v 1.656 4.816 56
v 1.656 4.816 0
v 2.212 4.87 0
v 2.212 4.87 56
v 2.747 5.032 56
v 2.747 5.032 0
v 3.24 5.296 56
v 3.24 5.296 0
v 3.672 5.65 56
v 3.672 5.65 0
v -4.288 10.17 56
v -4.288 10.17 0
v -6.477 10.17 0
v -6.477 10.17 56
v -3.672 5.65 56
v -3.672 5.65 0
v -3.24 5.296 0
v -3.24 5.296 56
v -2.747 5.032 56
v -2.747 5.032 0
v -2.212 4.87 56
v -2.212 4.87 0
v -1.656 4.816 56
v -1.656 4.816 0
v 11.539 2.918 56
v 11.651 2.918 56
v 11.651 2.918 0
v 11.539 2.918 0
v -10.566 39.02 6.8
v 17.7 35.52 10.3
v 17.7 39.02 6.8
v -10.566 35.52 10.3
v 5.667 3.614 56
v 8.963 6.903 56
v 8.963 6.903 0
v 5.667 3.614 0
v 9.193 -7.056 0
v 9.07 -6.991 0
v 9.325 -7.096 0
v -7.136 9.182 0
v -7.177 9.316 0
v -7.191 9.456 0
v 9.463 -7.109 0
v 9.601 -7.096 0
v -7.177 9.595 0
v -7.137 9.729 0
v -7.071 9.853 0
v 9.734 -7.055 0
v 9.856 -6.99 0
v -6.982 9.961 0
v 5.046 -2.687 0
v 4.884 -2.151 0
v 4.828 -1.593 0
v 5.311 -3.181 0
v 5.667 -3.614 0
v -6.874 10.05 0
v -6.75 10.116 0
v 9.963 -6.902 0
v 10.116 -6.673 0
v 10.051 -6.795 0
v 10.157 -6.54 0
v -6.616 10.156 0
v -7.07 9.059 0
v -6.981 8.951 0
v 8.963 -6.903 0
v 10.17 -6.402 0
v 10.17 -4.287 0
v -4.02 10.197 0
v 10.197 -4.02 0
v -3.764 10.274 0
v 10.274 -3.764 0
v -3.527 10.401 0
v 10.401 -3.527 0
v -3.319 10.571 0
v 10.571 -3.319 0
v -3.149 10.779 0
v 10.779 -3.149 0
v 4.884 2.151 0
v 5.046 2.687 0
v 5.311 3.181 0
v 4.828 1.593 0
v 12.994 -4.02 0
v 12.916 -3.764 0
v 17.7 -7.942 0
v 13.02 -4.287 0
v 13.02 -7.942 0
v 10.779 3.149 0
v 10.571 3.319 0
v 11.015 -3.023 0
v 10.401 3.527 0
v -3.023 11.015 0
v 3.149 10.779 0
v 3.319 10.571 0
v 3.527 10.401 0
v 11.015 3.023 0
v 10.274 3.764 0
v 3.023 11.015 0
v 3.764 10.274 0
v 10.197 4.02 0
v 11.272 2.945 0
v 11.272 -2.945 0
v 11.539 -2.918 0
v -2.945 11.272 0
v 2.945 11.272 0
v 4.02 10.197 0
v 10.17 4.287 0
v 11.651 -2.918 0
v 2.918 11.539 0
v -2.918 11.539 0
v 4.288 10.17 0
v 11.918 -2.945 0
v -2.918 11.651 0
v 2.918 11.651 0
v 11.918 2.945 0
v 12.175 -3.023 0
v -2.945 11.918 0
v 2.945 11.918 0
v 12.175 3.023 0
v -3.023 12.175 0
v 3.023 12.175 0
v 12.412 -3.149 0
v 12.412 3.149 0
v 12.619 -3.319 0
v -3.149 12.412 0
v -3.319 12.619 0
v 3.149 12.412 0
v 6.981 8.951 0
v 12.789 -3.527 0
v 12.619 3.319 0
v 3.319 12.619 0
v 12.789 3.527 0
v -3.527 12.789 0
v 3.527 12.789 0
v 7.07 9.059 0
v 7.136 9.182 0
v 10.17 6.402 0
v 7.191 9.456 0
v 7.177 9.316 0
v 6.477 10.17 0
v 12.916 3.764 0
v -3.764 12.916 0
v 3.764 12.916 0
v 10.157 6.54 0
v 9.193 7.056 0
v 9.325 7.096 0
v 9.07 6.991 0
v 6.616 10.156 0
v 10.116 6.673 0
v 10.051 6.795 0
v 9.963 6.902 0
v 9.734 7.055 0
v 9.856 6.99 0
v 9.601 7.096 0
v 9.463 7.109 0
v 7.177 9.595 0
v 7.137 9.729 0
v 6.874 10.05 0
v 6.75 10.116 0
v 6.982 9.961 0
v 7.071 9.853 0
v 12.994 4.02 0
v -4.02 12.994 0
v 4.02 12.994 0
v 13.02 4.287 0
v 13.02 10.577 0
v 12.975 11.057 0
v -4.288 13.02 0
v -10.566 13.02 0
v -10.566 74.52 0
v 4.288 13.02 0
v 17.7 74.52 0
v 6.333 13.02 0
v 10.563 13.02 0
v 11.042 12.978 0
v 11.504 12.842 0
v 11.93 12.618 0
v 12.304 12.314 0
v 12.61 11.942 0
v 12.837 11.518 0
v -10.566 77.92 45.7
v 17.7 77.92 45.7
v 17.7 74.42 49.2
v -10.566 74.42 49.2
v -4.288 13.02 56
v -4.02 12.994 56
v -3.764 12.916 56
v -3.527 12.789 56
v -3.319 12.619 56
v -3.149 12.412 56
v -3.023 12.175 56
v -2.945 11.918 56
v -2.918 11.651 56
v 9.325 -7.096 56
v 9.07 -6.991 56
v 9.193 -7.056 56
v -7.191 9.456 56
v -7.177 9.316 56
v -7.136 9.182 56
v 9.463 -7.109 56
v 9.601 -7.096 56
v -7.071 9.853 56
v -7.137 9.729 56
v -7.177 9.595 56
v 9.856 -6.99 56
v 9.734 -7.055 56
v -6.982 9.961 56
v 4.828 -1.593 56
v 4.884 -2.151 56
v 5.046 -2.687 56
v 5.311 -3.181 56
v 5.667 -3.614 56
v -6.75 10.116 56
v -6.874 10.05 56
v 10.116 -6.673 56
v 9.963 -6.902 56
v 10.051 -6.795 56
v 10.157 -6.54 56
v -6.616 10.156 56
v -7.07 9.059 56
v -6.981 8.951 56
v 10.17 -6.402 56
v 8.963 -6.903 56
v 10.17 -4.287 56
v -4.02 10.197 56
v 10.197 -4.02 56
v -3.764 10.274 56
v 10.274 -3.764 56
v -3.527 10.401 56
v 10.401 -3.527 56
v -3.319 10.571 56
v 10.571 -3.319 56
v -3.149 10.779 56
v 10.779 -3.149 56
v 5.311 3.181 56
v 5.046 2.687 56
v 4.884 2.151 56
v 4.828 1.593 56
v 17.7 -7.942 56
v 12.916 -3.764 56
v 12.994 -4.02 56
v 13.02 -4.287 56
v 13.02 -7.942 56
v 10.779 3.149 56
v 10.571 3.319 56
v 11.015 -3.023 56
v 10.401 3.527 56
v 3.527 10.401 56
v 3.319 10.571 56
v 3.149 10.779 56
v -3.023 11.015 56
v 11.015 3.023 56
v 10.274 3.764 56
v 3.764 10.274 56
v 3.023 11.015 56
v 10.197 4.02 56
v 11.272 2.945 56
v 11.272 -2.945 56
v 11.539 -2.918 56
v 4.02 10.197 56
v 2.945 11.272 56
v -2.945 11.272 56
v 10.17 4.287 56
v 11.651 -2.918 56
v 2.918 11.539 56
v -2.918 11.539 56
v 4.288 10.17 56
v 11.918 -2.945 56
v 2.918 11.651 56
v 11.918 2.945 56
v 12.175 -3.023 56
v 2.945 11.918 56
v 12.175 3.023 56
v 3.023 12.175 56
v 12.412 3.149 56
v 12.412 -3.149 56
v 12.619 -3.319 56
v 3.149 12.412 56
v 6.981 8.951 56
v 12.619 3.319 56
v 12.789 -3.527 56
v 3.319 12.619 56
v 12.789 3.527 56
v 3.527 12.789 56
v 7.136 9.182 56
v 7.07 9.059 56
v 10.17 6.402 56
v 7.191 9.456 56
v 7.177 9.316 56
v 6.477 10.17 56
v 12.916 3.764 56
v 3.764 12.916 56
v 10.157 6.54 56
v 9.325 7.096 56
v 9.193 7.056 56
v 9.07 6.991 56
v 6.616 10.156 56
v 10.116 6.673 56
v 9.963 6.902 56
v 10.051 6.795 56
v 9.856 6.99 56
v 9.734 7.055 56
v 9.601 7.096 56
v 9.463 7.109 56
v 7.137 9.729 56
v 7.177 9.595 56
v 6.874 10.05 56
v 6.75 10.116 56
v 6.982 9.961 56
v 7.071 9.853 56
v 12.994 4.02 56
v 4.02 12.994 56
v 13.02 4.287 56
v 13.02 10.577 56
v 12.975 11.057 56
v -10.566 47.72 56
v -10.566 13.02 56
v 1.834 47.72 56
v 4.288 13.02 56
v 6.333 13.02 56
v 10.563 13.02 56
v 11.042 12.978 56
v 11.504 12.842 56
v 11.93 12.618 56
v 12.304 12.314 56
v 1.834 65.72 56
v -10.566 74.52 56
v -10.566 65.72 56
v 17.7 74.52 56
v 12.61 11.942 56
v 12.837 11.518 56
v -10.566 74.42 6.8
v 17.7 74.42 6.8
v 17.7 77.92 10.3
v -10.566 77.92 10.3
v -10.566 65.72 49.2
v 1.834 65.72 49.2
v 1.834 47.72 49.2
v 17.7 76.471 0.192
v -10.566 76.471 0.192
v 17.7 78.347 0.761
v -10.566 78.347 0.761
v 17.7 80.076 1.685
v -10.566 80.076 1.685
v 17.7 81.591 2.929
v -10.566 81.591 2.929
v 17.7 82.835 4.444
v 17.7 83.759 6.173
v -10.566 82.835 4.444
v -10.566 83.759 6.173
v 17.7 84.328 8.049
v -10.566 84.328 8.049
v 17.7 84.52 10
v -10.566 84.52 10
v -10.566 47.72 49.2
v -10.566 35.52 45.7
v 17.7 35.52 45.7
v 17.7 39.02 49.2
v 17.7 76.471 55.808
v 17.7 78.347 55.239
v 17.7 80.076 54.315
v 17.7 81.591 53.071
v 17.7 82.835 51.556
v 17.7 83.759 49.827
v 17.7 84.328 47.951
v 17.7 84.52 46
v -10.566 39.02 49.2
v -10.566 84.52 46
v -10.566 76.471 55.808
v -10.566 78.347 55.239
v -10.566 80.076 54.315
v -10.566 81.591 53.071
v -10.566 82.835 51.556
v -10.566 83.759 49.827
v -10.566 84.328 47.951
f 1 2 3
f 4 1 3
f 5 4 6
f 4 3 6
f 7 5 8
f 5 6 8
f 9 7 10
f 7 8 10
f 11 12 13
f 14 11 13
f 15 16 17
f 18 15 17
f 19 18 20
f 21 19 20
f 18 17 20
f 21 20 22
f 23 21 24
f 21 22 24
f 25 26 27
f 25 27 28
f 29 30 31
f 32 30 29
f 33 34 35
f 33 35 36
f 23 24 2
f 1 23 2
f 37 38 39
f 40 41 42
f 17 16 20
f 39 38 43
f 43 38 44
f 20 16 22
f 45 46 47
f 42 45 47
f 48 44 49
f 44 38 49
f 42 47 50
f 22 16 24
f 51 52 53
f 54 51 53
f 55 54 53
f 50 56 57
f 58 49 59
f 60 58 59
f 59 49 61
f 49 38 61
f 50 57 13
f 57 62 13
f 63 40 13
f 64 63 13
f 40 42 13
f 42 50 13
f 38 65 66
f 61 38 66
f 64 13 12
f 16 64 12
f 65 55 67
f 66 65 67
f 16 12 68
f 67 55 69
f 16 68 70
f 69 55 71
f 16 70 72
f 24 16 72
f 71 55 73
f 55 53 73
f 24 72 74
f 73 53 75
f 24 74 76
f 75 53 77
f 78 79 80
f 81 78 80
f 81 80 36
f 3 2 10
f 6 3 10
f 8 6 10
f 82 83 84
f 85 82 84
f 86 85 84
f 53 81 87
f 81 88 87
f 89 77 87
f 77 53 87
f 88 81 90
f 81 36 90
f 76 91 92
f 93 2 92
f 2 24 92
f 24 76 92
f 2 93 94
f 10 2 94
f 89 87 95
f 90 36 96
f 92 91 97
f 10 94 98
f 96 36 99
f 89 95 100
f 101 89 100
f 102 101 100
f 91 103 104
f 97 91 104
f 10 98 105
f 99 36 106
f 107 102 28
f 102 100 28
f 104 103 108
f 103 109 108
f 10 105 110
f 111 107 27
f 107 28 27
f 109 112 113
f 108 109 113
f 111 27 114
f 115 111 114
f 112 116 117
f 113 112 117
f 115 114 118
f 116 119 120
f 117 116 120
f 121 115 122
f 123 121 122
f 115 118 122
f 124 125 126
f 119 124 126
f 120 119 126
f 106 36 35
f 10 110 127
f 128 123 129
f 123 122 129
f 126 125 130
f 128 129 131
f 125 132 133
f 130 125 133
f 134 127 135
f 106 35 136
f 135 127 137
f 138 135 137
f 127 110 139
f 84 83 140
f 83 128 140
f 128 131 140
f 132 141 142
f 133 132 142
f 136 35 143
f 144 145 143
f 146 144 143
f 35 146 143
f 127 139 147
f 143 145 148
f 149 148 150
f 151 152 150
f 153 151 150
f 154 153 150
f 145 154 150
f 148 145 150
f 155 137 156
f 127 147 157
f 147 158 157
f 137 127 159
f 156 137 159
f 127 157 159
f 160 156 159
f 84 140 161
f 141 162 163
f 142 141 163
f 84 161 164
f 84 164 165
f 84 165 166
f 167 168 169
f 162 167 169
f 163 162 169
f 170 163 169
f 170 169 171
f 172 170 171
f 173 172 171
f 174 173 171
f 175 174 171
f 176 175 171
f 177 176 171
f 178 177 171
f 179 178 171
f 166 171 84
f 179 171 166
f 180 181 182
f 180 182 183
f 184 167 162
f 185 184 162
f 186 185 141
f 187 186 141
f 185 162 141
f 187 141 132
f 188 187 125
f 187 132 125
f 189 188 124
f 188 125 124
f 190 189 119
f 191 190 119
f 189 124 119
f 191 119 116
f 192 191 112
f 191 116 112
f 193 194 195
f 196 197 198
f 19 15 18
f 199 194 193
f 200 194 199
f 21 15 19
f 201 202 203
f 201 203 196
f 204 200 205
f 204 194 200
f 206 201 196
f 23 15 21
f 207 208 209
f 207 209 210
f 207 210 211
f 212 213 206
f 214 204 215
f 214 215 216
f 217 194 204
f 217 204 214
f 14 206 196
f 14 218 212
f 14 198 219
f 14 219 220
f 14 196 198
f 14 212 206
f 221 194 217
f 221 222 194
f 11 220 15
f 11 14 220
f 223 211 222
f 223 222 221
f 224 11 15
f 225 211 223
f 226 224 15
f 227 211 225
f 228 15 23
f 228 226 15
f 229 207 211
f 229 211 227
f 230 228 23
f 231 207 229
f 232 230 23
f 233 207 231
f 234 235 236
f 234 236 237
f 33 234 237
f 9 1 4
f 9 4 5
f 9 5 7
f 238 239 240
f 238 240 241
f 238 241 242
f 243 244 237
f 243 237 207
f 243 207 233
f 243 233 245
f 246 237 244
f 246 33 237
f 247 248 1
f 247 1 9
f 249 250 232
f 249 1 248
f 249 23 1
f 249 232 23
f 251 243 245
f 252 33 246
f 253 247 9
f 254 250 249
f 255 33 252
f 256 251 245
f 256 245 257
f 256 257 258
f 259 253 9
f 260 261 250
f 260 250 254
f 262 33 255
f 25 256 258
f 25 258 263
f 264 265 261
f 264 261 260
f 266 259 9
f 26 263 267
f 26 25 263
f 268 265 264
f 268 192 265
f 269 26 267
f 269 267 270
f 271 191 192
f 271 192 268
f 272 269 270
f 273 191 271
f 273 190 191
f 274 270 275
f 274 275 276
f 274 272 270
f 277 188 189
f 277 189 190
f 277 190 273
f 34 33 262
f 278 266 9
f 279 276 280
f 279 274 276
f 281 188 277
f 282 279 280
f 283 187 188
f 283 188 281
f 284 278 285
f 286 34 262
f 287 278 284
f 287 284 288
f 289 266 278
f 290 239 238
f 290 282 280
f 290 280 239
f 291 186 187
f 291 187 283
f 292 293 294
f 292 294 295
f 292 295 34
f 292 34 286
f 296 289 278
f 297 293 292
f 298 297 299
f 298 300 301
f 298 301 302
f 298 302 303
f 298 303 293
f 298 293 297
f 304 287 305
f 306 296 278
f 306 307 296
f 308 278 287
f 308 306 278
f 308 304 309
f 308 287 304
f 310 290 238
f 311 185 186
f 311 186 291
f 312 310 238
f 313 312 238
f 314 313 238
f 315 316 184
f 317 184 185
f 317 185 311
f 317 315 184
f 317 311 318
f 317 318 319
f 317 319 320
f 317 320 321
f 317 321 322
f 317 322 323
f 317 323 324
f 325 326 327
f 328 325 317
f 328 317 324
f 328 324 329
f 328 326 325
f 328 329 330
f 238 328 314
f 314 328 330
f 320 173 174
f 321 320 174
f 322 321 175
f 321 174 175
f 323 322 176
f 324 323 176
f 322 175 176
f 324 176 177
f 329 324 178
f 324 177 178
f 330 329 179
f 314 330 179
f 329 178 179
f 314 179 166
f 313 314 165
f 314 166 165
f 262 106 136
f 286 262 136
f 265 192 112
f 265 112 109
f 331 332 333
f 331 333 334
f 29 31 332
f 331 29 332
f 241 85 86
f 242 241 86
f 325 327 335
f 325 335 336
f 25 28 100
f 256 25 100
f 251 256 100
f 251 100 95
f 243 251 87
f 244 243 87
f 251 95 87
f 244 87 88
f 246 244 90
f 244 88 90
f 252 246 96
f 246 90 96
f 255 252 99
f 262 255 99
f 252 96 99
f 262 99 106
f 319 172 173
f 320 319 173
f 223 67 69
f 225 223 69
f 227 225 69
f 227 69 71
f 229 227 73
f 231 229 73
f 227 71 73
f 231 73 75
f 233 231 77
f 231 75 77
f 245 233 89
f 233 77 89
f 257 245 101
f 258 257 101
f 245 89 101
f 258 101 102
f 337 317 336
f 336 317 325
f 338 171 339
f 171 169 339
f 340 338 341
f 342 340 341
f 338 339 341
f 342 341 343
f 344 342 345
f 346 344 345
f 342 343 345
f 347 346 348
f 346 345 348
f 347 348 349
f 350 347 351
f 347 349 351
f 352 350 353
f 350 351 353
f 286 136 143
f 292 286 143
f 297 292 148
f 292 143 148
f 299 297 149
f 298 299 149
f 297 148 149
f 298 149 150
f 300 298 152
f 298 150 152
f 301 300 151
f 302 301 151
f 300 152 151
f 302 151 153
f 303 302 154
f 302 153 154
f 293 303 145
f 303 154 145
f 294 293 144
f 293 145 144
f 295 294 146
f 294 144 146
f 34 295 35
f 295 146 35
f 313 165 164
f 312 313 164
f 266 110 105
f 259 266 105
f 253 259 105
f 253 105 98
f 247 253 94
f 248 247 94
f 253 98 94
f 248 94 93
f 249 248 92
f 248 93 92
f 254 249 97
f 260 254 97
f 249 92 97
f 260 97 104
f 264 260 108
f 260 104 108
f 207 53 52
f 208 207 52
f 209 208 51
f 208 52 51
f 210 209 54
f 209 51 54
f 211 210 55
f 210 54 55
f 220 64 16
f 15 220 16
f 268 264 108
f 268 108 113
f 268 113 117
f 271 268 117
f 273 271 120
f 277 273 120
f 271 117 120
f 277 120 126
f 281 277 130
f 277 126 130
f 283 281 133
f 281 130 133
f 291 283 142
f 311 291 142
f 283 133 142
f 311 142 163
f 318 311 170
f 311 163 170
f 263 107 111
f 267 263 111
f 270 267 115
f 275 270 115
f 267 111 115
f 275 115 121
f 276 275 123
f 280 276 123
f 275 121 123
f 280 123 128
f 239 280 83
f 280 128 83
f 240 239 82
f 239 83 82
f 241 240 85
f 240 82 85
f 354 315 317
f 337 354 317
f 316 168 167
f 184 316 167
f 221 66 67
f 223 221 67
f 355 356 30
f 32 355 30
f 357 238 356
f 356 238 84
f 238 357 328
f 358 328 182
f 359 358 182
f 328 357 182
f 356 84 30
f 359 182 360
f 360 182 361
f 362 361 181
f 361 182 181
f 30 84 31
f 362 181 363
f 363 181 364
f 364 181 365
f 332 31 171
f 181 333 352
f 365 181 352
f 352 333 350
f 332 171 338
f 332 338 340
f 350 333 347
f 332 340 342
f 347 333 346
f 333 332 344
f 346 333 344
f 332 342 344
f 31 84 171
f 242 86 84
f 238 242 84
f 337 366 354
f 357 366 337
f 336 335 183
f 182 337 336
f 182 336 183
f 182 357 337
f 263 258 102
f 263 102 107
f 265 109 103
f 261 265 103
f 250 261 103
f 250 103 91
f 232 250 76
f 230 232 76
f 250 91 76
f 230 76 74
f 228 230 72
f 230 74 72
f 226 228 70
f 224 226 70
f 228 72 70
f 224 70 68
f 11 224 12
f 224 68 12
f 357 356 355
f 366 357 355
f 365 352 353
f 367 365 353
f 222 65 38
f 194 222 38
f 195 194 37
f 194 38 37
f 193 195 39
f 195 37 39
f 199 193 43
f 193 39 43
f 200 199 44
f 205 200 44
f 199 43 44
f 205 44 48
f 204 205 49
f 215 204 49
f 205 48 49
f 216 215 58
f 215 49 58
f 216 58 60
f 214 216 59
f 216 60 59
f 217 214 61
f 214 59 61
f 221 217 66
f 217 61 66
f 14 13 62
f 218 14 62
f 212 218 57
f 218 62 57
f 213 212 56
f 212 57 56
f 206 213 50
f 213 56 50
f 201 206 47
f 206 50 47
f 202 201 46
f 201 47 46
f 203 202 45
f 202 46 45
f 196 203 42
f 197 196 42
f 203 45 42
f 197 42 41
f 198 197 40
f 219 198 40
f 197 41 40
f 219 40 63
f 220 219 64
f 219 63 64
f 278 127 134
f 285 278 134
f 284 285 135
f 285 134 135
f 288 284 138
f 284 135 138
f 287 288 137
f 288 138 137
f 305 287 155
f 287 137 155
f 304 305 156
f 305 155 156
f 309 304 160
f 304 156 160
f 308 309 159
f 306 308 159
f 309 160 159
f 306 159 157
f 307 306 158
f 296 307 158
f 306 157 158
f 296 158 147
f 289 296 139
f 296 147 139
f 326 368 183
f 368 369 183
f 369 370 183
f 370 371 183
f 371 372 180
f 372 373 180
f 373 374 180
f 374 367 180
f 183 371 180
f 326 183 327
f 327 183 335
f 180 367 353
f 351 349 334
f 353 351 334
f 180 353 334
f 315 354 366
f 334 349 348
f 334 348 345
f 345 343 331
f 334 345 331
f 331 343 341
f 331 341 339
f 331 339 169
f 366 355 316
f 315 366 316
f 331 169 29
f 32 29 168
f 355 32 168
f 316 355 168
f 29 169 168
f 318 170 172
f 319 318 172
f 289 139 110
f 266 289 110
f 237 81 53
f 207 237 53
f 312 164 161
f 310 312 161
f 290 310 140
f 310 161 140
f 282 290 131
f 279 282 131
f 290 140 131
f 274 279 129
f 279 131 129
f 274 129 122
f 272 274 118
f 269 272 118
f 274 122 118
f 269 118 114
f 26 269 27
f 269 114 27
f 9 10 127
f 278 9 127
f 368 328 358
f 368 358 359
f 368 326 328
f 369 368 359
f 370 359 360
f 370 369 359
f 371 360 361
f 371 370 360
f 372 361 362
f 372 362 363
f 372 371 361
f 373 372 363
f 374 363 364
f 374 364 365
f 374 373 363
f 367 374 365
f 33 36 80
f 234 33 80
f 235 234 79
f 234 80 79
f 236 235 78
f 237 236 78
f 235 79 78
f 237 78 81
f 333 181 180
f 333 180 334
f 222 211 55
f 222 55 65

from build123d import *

# Parameters (mm, degrees)
BOSS_EXTRUDE1_DEPTH = 56
SKETCH14_W          = 42.4
SKETCH14_H          = 42.4
CUT_EXTRUDE1_DEPTH  = 56
CHAMFER1_SIZE       = 3.5
FILLET1_R           = 10
CUT_EXTRUDE4_REACH  = 104.922
SKETCH17_W          = 15.453545708
SKETCH17_H          = 18


with BuildPart() as part:
    # Sketch1 → Boss-Extrude1 (new body)
    with BuildSketch(Plane.XY):
        with BuildLine():
            Line((13.02, -7.9417418), (17.7, -7.9417418))
            Line((17.7, -7.9417418), (17.7, 84.52))
            Line((17.7, 84.52), (-10.566443095, 84.52))
            Line((-10.566443095, 84.52), (-10.566443095, 13.02))
            Line((-10.566443095, 13.02), (-5.317126718, 13.02))
            Line((-5.317126718, 13.02), (-4.287512407, 13.02))
            ThreePointArc((-4.287512407, 13.02), (-3.319474451, 12.619025549), (-2.9185, 11.650987593))
            Line((-2.9185, 11.650987593), (-2.9185, 11.539212407))
            ThreePointArc((-2.9185, 11.539212407), (-3.319474451, 10.571174451), (-4.287512407, 10.1702))
            Line((-4.287512407, 10.1702), (-6.476788598, 10.1702))
            ThreePointArc((-6.476788598, 10.1702), (-7.136510935, 9.729114651), (-6.981020848, 8.950903446))
            Line((-6.981020848, 8.950903446), (-3.672257405, 5.649701928))
            ThreePointArc((-3.672257405, 5.649701928), (-2.746830644, 5.032499411), (-1.655778399, 4.8158))
            Line((-1.655778399, 4.8158), (1.655778399, 4.8158))
            ThreePointArc((1.655778399, 4.8158), (2.746830644, 5.032499411), (3.672257405, 5.649701928))
            Line((3.672257405, 5.649701928), (6.981020848, 8.950903446))
            ThreePointArc((6.981020848, 8.950903446), (7.136510935, 9.729114651), (6.476788598, 10.1702))
            Line((6.476788598, 10.1702), (4.287512407, 10.1702))
            ThreePointArc((4.287512407, 10.1702), (3.319474451, 10.571174451), (2.9185, 11.539212407))
            Line((2.9185, 11.539212407), (2.9185, 11.650987593))
            ThreePointArc((2.9185, 11.650987593), (3.319474451, 12.619025549), (4.287512407, 13.02))
            Line((4.287512407, 13.02), (6.332886163, 13.02))
            Line((6.332886163, 13.02), (10.562594215, 13.019824354))
            ThreePointArc((10.562594215, 13.019824354), (12.303594776, 12.313982883), (13.019956614, 10.577284622))
            Line((13.019956614, 10.577284622), (13.02, 4.287469289))
            ThreePointArc((13.02, 4.287469289), (12.619025549, 3.319431332), (11.650987593, 2.918456882))
            Line((11.650987593, 2.918456882), (11.539212407, 2.918456882))
            ThreePointArc((11.539212407, 2.918456882), (10.571174451, 3.319431332), (10.1702, 4.287469289))
            Line((10.1702, 4.287469289), (10.1702, 6.402089023))
            ThreePointArc((10.1702, 6.402089023), (9.733877283, 7.055496588), (8.963146507, 6.90287605))
            Line((8.963146507, 6.90287605), (5.667020993, 3.614283579))
            ThreePointArc((5.667020993, 3.614283579), (5.046449321, 2.687255303), (4.8285, 1.593185507))
            Line((4.8285, 1.593185507), (4.8285, -1.593185507))
            ThreePointArc((4.8285, -1.593185507), (5.046449321, -2.687255303), (5.667020993, -3.614283579))
            Line((5.667020993, -3.614283579), (8.963146507, -6.90287605))
            ThreePointArc((8.963146507, -6.90287605), (9.733877283, -7.055496588), (10.1702, -6.402089023))
            Line((10.1702, -6.402089023), (10.1702, -4.287469289))
            ThreePointArc((10.1702, -4.287469289), (10.571174451, -3.319431332), (11.539212407, -2.918456882))
            Line((11.539212407, -2.918456882), (11.650987593, -2.918456882))
            ThreePointArc((11.650987593, -2.918456882), (12.619025549, -3.319431332), (13.02, -4.287469289))
            Line((13.02, -4.287469289), (13.02, -5.3170836))
            Line((13.02, -5.3170836), (13.02, -7.9417418))
        make_face()
    extrude(amount=BOSS_EXTRUDE1_DEPTH)

    # Sketch14 → Cut-Extrude1 (cut)
    with BuildSketch(Plane(origin=(17.7, 0, 0), x_dir=(0, 0, -1), z_dir=(1, 0, 0))):
        with Locations((-28, 56.72)):
            Rectangle(SKETCH14_W, SKETCH14_H)
    extrude(amount=-CUT_EXTRUDE1_DEPTH, mode=Mode.SUBTRACT)

    # Chamfer1
    chamfer1_edges = [part.edges().sort_by_distance(p)[0] for p in [
        (3.566778452, 35.52, 49.2),
        (3.566778452, 77.92, 49.2),
        (3.566778452, 77.92, 6.8),
        (3.566778452, 35.52, 6.8),
    ]]
    chamfer(chamfer1_edges, length=CHAMFER1_SIZE)

    # Fillet1
    fillet1_edges = [part.edges().sort_by_distance(p)[0] for p in [
        (3.566778452, 84.52, 56),
        (3.566778452, 84.52, 0),
    ]]
    fillet(fillet1_edges, radius=FILLET1_R)

    # Sketch17 → Cut-Extrude4 (cut, up to next)
    with BuildSketch(Plane.XY.offset(56), mode=Mode.PRIVATE) as cut_extrude4_sk1:
        with Locations((-5.893215949, 56.72)):
            Rectangle(SKETCH17_W, SKETCH17_H)
    cut_extrude4_tool1 = extrude(cut_extrude4_sk1.sketch, amount=-CUT_EXTRUDE4_REACH, mode=Mode.PRIVATE) & part.part
    add(cut_extrude4_tool1.solids().sort_by_distance((-5.893216, 56.72, 56))[0], mode=Mode.SUBTRACT)


solid = part.part
